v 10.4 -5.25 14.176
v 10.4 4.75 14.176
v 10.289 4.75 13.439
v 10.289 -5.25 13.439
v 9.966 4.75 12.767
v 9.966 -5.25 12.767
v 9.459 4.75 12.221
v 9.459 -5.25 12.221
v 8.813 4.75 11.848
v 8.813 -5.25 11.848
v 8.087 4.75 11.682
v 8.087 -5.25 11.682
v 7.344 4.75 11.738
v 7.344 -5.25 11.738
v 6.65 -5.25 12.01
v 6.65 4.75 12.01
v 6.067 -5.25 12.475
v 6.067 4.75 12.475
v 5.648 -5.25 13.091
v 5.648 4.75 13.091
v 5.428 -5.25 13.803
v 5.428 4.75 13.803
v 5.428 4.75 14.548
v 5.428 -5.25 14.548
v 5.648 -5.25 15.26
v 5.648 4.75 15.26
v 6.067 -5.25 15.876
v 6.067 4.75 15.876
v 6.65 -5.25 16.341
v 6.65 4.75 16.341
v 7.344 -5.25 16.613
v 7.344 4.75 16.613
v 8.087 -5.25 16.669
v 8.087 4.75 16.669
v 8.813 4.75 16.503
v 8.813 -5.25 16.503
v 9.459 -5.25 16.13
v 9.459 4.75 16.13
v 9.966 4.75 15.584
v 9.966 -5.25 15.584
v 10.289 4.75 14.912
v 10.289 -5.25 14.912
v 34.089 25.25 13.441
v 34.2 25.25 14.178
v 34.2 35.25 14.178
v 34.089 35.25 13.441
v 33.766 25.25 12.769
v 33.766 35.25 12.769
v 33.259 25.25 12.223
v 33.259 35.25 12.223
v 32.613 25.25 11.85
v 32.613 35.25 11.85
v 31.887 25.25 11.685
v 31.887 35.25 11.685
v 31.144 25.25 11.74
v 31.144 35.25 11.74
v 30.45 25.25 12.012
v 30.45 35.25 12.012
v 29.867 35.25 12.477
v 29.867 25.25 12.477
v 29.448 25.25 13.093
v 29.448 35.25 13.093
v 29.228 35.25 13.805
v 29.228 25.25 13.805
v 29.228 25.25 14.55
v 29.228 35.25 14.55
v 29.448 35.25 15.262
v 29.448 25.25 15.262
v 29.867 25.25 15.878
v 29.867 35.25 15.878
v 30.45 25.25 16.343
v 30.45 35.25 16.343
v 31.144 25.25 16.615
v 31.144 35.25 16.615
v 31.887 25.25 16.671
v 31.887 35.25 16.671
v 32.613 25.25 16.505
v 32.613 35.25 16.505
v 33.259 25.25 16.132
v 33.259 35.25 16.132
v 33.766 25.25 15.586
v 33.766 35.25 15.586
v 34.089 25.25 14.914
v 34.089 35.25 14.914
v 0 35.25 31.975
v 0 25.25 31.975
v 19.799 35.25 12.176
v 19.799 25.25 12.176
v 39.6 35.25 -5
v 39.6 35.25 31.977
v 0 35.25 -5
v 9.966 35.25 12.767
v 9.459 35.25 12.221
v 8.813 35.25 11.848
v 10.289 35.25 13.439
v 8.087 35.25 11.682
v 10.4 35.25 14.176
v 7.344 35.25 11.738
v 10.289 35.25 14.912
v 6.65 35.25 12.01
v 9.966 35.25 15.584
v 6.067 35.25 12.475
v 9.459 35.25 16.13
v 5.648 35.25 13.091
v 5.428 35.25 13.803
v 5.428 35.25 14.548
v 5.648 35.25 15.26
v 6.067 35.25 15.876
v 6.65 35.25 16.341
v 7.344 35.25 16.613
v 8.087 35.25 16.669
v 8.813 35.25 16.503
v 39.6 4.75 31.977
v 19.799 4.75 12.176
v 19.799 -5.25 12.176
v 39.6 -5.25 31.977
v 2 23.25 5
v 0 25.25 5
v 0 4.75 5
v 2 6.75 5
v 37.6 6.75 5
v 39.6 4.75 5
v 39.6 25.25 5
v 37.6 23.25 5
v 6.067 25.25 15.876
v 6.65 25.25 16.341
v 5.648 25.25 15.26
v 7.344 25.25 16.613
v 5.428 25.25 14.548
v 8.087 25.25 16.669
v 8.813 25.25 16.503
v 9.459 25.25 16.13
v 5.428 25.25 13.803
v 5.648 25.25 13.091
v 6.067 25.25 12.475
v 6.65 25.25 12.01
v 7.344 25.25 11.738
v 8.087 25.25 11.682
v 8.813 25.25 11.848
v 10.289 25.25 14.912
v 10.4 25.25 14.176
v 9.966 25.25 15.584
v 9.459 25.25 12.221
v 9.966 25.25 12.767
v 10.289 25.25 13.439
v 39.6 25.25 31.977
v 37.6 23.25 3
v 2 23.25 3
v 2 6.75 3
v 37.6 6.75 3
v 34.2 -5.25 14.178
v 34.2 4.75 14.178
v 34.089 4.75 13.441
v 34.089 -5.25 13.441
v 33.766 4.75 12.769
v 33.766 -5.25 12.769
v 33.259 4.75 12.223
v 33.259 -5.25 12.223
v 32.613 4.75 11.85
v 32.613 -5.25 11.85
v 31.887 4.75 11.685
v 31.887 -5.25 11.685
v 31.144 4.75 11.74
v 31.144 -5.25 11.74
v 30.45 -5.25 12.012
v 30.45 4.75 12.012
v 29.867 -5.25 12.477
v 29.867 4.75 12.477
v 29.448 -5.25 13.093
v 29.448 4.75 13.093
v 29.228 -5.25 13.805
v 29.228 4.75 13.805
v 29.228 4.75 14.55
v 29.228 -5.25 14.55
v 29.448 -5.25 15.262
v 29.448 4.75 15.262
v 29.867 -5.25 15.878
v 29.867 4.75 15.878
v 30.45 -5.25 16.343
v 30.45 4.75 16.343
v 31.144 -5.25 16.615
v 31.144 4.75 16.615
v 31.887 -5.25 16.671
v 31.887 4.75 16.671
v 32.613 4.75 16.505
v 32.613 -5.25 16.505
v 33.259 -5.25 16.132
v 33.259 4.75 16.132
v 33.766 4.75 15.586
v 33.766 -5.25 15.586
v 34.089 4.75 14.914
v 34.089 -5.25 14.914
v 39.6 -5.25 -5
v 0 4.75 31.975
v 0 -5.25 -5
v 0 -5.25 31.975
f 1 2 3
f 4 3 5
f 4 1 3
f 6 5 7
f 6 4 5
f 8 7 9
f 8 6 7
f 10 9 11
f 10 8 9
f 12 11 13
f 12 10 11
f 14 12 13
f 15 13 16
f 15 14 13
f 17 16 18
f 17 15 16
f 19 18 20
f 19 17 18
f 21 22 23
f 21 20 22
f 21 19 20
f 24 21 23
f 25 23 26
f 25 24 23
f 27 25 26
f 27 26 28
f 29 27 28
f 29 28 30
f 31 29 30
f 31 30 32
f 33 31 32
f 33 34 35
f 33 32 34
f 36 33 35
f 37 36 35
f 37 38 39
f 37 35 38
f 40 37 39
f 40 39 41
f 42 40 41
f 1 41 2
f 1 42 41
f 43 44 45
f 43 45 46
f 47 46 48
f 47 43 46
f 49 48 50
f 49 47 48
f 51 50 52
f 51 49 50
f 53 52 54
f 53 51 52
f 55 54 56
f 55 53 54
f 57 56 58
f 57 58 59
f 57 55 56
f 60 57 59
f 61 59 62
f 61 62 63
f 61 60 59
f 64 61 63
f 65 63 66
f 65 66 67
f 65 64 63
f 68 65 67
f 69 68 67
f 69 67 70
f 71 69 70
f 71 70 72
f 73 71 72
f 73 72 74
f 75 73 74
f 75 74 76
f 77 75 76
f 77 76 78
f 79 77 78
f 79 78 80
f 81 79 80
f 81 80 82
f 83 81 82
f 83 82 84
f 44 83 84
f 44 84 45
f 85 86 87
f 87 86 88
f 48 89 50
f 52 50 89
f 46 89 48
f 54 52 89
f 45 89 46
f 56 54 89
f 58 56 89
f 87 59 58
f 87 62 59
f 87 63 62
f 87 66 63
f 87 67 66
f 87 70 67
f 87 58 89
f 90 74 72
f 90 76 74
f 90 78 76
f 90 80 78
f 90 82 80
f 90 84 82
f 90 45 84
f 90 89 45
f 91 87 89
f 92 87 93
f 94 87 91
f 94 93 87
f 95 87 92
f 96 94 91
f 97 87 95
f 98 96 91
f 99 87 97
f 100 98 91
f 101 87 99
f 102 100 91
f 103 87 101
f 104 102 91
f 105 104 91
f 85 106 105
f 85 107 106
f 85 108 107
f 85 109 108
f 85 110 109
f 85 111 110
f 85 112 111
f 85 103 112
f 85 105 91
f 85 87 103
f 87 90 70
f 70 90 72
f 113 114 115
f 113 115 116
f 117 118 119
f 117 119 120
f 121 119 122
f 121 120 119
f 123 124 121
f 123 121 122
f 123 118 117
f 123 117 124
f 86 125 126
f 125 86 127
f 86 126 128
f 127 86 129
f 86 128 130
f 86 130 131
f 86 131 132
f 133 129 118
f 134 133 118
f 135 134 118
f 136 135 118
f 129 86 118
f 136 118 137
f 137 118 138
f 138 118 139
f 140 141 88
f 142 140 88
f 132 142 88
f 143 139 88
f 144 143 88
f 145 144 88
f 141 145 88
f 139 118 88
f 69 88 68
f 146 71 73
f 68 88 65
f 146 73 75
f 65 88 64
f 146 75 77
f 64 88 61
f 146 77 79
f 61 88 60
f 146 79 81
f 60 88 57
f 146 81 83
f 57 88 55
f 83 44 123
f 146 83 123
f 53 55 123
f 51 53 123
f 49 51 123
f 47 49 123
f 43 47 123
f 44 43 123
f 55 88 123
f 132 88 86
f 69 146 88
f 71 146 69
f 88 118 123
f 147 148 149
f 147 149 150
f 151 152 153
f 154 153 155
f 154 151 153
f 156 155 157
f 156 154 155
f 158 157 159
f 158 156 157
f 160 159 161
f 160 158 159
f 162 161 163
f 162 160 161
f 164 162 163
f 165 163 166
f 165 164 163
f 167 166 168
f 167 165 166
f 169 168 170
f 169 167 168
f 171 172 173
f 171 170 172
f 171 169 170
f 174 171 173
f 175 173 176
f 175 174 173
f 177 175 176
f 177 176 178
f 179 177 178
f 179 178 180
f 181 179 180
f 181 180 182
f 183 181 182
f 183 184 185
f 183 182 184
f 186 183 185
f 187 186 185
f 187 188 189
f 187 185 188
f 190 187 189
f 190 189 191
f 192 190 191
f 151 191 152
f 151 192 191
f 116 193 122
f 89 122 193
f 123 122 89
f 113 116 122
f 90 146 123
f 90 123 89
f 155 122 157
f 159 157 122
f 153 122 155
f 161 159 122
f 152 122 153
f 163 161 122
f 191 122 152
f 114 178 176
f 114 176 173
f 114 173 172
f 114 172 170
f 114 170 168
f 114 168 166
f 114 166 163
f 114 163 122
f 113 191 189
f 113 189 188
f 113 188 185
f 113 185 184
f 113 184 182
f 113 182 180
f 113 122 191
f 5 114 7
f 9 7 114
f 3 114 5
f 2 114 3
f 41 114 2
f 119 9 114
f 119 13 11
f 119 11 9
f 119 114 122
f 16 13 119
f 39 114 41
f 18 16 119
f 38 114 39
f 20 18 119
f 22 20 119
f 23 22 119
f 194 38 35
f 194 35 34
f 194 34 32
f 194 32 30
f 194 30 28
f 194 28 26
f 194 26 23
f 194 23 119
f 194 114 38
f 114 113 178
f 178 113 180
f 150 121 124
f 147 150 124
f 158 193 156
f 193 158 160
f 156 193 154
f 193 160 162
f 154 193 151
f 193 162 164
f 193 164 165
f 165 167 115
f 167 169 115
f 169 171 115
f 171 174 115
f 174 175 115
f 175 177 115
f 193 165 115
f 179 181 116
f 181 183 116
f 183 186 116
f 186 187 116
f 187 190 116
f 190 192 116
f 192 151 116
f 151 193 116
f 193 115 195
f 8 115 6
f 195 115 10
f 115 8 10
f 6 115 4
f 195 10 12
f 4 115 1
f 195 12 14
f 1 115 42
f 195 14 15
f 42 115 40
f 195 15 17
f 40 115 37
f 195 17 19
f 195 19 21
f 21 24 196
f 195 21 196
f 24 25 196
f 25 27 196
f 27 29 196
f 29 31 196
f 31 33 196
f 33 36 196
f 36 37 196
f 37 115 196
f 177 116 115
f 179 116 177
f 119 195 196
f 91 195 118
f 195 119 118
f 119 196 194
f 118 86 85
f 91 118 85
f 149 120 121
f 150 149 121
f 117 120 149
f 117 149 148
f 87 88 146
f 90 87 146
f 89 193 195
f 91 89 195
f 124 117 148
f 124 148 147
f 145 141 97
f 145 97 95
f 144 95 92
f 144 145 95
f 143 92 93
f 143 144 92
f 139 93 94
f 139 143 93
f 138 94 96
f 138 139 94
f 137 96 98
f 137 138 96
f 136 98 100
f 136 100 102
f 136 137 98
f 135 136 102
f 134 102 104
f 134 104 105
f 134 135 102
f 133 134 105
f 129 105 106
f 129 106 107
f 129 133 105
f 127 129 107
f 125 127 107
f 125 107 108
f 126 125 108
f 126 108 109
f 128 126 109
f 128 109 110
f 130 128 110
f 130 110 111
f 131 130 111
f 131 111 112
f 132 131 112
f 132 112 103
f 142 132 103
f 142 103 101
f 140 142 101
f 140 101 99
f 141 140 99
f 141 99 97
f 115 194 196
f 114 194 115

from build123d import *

# Parameters (mm, degrees)
SKETCH1_W                = 39.6
SKETCH1_H                = 30
BOSS_EXTRUDE1_DEPTH      = 5
BOSS_EXTRUDE2_DEPTH      = 5.25
BOSS_EXTRUDE2_DEPTH_BACK = 4.75
BOSS_EXTRUDE3_DEPTH      = 5.25
BOSS_EXTRUDE3_DEPTH_BACK = 4.75
SKETCH4_W                = 39.6
SKETCH4_H                = 5
BOSS_EXTRUDE4_DEPTH      = 5.25
SKETCH5_W                = 39.6
SKETCH5_H                = 5
BOSS_EXTRUDE5_DEPTH      = 5.25
SKETCH8_W                = 39.6
SKETCH8_H                = 40.5
BOSS_EXTRUDE6_DEPTH      = 5
SKETCH9_W                = 35.6
SKETCH9_H                = 16.5
CUT_EXTRUDE1_DEPTH       = 2
HOLE1_START              = -5.25
HOLE1_OUTLINE_R          = 2.5
HOLE1_DEPTH              = 40.5
HOLE2_START              = -5.25
HOLE2_OUTLINE_R          = 2.5
HOLE2_DEPTH              = 40.5


# Read off the part's stored shape, not the designer's step: Hole1, Hole2
with BuildPart() as part:
    # Sketch1 → Boss-Extrude1 (new body)
    with BuildSketch(Plane.XY):
        with Locations((19.8, 15)):
            Rectangle(SKETCH1_W, SKETCH1_H)
    extrude(amount=BOSS_EXTRUDE1_DEPTH)

    # Sketch2 → Boss-Extrude2 (add, two sides: drawn at the far end of the back side and taken through both)
    with BuildSketch(Plane.XZ.offset(-BOSS_EXTRUDE2_DEPTH_BACK)):
        Polygon((0, 5), (0, 31.975), (19.798989873, 12.176010127), (39.6, 31.977020254), (39.6, 5), align=None)
    extrude(amount=BOSS_EXTRUDE2_DEPTH + BOSS_EXTRUDE2_DEPTH_BACK)

    # Sketch3 → Boss-Extrude3 (add, two sides: drawn at the far end of the back side and taken through both)
    with BuildSketch(Plane(origin=(0, 30, 0), x_dir=(1, 0, 0), z_dir=(0, 1, 0)).offset(-BOSS_EXTRUDE3_DEPTH_BACK)):
        Polygon((0, -5), (0, -31.975), (19.798989873, -12.176010127), (39.6, -31.977020254), (39.6, -5), align=None)
    extrude(amount=BOSS_EXTRUDE3_DEPTH + BOSS_EXTRUDE3_DEPTH_BACK)

    # Sketch4 → Boss-Extrude4 (add)
    with BuildSketch(Plane(origin=(0, 30, 0), x_dir=(1, 0, 0), z_dir=(0, 1, 0))):
        with Locations((19.8, -2.5)):
            Rectangle(SKETCH4_W, SKETCH4_H)
    extrude(amount=BOSS_EXTRUDE4_DEPTH)

    # Sketch5 → Boss-Extrude5 (add)
    with BuildSketch(Plane.XZ):
        with Locations((19.8, 2.5)):
            Rectangle(SKETCH5_W, SKETCH5_H)
    extrude(amount=BOSS_EXTRUDE5_DEPTH)

    # Sketch8 → Boss-Extrude6 (add)
    with BuildSketch(Plane(origin=(0, 0, 0), x_dir=(-1, 0, 0), z_dir=(0, 0, -1))):
        with Locations((-19.8, 15)):
            Rectangle(SKETCH8_W, SKETCH8_H)
    extrude(amount=BOSS_EXTRUDE6_DEPTH)

    # Sketch9 → Cut-Extrude1 (cut)
    with BuildSketch(Plane.XY.offset(5)):
        with Locations((19.8, 15)):
            Rectangle(SKETCH9_W, SKETCH9_H)
    extrude(amount=-CUT_EXTRUDE1_DEPTH, mode=Mode.SUBTRACT)

    # Hole1 outline → Hole1 (cut)
    with BuildSketch(Plane(origin=(0, 0, 0), x_dir=(1, 0, 0), z_dir=(0, 1, 0)).offset(HOLE1_START)):
        with Locations((7.9, -14.175505063)):
            Circle(HOLE1_OUTLINE_R)
    extrude(amount=HOLE1_DEPTH, mode=Mode.SUBTRACT)

    # Hole2 outline → Hole2 (cut)
    with BuildSketch(Plane(origin=(0, 0, 0), x_dir=(1, 0, 0), z_dir=(0, 1, 0)).offset(HOLE2_START)):
        with Locations((31.7, -14.177525317)):
            Circle(HOLE2_OUTLINE_R)
    extrude(amount=HOLE2_DEPTH, mode=Mode.SUBTRACT)


solid = part.part
